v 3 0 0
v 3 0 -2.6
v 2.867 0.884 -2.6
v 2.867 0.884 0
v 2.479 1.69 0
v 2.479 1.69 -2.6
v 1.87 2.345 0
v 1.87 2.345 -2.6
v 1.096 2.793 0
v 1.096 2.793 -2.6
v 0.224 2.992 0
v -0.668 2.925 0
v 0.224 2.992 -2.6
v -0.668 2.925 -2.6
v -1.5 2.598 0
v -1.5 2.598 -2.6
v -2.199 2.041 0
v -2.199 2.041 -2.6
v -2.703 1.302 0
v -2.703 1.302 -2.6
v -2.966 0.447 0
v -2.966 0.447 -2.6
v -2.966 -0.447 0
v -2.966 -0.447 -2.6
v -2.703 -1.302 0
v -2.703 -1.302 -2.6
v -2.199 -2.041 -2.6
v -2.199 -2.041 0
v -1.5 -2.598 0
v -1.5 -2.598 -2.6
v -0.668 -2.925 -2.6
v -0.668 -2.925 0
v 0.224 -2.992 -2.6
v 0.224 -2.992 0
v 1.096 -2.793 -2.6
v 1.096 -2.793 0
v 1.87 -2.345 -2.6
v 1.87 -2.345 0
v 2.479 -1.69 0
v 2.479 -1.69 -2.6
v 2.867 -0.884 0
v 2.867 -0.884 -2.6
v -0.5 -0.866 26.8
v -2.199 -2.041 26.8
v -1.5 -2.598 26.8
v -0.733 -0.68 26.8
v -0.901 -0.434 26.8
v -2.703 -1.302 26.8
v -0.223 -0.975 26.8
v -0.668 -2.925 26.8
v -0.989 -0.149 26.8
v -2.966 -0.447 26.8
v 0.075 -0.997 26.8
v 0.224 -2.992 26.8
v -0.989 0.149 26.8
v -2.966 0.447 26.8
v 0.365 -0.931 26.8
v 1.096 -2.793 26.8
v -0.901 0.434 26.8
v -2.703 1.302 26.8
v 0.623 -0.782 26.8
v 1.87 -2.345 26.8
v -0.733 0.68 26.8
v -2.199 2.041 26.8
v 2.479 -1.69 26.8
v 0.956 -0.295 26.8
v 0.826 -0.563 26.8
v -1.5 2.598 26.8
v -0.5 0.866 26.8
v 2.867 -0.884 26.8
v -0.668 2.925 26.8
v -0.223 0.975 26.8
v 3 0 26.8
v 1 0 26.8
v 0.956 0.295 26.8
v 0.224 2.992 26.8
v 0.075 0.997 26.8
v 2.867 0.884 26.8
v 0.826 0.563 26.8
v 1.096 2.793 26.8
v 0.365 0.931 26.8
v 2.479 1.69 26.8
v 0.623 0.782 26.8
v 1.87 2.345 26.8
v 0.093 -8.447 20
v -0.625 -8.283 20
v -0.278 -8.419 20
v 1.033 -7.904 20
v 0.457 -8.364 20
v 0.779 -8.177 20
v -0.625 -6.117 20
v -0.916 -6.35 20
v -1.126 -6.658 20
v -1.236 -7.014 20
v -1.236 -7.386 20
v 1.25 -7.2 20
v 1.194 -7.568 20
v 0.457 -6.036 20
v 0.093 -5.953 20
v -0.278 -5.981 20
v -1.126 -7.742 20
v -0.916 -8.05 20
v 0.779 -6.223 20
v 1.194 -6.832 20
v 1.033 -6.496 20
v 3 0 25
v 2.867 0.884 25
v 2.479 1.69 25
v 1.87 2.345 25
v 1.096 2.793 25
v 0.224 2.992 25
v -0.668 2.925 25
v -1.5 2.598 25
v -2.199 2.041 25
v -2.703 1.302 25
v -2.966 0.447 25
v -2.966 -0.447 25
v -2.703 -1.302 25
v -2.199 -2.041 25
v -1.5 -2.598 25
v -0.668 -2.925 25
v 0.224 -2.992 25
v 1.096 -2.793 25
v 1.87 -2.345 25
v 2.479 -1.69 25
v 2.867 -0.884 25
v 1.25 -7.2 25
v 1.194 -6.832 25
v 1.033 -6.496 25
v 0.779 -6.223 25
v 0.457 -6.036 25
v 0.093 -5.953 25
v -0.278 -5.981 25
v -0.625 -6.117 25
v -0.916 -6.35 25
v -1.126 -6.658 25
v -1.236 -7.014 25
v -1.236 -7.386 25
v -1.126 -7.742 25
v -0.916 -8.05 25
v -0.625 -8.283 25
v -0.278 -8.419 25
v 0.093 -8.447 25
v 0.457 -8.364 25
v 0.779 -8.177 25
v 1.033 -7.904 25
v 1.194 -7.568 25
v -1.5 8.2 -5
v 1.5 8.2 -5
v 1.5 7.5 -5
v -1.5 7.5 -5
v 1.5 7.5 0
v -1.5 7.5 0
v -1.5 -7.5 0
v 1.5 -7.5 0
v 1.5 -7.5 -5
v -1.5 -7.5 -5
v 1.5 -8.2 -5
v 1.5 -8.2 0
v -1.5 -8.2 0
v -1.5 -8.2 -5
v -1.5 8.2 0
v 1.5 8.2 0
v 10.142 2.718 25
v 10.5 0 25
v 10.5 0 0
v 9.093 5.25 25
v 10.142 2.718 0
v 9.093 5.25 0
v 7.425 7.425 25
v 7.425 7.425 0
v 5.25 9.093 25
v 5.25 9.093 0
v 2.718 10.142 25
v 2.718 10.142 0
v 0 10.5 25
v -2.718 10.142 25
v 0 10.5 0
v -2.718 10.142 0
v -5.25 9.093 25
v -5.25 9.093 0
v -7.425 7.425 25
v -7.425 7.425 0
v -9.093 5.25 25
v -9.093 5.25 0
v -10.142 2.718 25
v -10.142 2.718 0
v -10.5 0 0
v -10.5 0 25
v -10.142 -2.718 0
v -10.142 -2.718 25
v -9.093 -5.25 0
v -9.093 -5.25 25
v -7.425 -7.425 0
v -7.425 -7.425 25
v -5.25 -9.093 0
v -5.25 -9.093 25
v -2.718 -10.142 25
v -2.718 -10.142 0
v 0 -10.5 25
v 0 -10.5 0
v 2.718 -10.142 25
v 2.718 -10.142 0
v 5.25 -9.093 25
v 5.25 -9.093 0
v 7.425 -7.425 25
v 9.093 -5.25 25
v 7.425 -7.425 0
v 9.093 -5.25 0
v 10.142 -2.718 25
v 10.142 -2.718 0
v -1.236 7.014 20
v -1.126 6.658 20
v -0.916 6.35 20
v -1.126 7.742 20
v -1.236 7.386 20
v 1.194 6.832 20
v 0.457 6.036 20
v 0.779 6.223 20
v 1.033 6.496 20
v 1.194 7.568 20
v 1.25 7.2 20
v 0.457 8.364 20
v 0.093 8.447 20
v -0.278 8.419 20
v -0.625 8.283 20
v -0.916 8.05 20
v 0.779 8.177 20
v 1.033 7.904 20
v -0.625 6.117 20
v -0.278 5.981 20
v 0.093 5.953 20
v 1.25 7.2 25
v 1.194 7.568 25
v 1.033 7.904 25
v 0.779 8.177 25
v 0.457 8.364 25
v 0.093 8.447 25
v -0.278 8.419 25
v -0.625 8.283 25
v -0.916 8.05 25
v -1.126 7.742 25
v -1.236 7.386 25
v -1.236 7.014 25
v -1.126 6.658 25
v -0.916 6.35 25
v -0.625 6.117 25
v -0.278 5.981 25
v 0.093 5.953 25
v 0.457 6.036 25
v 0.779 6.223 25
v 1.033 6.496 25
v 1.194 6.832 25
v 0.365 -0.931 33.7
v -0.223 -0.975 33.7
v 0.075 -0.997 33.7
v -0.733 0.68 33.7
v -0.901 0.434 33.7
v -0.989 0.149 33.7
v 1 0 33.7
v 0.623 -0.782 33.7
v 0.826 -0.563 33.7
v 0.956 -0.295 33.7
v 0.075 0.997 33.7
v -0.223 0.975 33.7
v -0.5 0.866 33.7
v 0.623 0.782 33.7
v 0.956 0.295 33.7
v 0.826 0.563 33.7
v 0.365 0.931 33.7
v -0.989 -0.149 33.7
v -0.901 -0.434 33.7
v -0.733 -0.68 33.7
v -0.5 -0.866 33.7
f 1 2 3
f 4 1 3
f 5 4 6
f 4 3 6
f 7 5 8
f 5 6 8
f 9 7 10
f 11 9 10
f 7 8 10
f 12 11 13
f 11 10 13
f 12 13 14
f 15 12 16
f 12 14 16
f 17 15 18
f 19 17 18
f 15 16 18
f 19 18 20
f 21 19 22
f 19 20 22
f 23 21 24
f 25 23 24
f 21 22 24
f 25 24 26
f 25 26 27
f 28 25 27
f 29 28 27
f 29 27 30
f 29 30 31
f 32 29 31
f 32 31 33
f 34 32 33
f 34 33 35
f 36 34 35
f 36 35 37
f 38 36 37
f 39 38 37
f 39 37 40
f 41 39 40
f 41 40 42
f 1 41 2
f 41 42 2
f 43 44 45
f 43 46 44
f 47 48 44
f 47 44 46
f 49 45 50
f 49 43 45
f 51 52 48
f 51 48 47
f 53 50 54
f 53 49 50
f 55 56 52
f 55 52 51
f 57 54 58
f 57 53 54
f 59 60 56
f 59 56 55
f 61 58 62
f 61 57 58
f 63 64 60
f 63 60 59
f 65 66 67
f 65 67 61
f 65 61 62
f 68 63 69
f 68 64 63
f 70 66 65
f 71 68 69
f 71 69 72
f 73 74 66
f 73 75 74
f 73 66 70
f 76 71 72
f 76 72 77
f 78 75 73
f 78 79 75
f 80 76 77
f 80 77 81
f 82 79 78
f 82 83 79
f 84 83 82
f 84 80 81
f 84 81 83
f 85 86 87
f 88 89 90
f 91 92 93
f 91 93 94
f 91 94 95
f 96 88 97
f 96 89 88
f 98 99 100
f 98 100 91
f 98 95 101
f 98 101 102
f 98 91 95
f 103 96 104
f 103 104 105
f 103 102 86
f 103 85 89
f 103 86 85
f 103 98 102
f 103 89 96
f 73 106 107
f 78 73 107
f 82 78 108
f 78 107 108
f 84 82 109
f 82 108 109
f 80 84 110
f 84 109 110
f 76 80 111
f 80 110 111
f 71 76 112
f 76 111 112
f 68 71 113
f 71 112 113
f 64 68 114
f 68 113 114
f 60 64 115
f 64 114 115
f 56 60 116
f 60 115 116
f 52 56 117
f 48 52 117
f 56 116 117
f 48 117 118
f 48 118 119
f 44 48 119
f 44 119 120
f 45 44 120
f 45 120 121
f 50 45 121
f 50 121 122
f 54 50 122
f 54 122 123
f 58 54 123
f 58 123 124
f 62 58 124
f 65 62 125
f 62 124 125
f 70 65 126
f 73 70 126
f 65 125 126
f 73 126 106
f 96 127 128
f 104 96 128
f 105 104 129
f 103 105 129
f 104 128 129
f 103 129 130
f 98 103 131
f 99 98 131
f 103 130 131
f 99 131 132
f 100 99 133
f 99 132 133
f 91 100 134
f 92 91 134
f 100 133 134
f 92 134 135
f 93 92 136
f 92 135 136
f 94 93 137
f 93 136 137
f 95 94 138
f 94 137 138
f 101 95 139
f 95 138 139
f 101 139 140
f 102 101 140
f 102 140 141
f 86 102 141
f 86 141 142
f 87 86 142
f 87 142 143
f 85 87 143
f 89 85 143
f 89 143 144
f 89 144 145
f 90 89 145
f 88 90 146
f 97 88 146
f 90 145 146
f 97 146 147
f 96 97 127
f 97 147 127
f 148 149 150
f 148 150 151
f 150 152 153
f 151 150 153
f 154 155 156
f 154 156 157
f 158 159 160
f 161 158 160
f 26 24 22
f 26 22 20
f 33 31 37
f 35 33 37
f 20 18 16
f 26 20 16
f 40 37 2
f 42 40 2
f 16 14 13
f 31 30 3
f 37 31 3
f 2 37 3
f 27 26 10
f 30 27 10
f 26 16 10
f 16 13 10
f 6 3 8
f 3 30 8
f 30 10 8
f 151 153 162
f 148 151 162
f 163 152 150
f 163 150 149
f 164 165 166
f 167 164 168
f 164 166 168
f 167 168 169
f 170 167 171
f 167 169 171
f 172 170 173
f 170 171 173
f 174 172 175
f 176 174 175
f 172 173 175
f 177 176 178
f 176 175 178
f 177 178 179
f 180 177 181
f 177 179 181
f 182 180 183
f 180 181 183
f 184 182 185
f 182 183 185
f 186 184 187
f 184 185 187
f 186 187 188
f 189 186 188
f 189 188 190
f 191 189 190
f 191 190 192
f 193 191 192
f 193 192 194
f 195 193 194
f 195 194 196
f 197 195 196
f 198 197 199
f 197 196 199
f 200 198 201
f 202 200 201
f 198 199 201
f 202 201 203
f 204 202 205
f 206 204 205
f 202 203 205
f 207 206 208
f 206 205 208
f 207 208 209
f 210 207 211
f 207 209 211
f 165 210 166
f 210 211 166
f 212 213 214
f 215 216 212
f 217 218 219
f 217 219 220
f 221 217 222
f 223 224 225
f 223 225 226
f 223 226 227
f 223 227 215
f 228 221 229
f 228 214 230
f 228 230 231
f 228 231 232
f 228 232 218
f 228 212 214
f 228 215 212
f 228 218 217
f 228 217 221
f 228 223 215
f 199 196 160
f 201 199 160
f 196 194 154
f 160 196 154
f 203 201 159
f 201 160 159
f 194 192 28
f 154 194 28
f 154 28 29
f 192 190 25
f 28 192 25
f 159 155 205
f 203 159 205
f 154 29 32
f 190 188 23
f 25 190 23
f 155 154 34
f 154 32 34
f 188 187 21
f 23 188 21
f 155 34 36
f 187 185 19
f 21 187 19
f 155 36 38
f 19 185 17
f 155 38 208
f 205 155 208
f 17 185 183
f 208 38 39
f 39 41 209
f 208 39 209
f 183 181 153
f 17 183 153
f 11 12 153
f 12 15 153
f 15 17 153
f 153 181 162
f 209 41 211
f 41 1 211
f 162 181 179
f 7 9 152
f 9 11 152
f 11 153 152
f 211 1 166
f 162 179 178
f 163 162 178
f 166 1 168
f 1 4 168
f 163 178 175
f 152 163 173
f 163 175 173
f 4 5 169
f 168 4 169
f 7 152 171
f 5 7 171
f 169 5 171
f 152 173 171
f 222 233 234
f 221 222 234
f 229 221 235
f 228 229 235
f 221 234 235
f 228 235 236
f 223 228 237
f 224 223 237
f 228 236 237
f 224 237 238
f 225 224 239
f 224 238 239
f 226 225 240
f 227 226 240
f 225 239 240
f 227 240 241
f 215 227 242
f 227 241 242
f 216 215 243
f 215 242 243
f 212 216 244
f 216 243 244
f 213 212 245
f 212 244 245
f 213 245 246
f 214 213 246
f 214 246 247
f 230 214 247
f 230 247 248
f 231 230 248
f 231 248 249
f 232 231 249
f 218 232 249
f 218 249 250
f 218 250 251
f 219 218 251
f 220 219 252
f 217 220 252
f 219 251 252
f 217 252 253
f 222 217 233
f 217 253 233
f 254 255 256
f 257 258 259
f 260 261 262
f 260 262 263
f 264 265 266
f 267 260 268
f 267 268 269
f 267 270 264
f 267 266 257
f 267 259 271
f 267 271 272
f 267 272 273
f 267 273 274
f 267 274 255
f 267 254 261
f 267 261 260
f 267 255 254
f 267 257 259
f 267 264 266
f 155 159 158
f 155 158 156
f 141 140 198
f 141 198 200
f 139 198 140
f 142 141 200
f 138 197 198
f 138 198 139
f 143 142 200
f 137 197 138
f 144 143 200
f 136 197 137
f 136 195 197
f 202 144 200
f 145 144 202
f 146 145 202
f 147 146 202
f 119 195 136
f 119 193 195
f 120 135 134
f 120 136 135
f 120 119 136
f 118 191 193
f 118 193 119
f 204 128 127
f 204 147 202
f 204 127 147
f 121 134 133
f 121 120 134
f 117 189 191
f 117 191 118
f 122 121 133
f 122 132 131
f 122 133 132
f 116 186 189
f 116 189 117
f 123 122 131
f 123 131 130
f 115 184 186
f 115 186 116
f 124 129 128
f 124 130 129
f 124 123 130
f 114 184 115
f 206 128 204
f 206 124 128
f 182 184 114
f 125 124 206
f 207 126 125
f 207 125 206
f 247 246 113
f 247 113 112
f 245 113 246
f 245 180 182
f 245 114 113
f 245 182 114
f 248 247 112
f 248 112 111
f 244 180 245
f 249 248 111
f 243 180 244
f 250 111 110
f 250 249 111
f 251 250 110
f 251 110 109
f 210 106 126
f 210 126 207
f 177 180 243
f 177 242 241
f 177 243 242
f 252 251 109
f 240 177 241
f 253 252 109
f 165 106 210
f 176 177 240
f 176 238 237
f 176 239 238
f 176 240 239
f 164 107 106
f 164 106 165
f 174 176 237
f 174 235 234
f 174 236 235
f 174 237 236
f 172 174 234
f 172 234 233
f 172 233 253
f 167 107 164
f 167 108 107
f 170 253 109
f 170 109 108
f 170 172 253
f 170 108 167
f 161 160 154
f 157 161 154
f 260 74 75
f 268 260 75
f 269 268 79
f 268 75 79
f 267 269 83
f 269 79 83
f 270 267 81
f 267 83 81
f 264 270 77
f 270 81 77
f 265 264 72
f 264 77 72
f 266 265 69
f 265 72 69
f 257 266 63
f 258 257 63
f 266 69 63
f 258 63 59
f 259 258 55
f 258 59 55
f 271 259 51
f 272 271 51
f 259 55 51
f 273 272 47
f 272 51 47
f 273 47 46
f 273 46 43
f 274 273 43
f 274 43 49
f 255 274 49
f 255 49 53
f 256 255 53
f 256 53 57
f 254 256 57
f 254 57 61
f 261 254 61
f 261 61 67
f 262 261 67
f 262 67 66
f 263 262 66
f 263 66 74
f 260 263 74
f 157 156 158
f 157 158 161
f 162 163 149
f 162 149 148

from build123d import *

# Parameters (mm, degrees)
SKETCH_1_R          = 10.5
EXTRUDE_1_DEPTH     = 25
SKETCH_2_R          = 3
EXTRUDE_2_DEPTH     = 1.8
EXTRUDE_START       = -1.8
SKETCH_3_R          = 1
EXTRUDE_3_DEPTH     = 8.7
EXTRUDE_START_2     = -27.6
SKETCH_2_2_R        = 3
EXTRUDE_4_DEPTH     = 2.6
SKETCH_4_W          = 3
SKETCH_4_H          = 0.7
EXTRUDE_5_DEPTH     = 5
SKETCH_5_R          = 1.25
CUT_EXTRUDE_1_DEPTH = 5


with BuildPart() as part:
    # 草图1 → 凸台-拉伸1 (new body)
    with BuildSketch(Plane.XY):
        Circle(SKETCH_1_R)
    extrude(amount=EXTRUDE_1_DEPTH)

    # 草图2 → 凸台-拉伸2 (add)
    with BuildSketch(Plane.XY.offset(25)):
        Circle(SKETCH_2_R)
    extrude(amount=EXTRUDE_2_DEPTH)

    # 草图3 → 凸台-拉伸3 (add)
    with BuildSketch(Plane.XY.offset(26.8).offset(EXTRUDE_START)):
        Circle(SKETCH_3_R)
    extrude(amount=EXTRUDE_3_DEPTH)

    # 草图2<2> → 凸台-拉伸4 (add)
    with BuildSketch(Plane.XY.offset(25).offset(EXTRUDE_START_2)):
        Circle(SKETCH_2_2_R)
    extrude(amount=EXTRUDE_4_DEPTH)

    # 草图4 → 凸台-拉伸5 (add)
    with BuildSketch(Plane(origin=(0, 0, 0), x_dir=(-1, 0, 0), z_dir=(0, 0, -1))):
        with Locations((0, 7.85)):
            Rectangle(SKETCH_4_W, SKETCH_4_H)
        with Locations((0, -7.85)):
            Rectangle(SKETCH_4_W, SKETCH_4_H)
    extrude(amount=EXTRUDE_5_DEPTH)

    # 草图5 → 切除-拉伸1 (cut)
    with BuildSketch(Plane.XY.offset(25)):
        with Locations((0, 7.2)):
            Circle(SKETCH_5_R)
        with Locations((0, -7.2)):
            Circle(SKETCH_5_R)
    extrude(amount=-CUT_EXTRUDE_1_DEPTH, mode=Mode.SUBTRACT)


solid = part.part
